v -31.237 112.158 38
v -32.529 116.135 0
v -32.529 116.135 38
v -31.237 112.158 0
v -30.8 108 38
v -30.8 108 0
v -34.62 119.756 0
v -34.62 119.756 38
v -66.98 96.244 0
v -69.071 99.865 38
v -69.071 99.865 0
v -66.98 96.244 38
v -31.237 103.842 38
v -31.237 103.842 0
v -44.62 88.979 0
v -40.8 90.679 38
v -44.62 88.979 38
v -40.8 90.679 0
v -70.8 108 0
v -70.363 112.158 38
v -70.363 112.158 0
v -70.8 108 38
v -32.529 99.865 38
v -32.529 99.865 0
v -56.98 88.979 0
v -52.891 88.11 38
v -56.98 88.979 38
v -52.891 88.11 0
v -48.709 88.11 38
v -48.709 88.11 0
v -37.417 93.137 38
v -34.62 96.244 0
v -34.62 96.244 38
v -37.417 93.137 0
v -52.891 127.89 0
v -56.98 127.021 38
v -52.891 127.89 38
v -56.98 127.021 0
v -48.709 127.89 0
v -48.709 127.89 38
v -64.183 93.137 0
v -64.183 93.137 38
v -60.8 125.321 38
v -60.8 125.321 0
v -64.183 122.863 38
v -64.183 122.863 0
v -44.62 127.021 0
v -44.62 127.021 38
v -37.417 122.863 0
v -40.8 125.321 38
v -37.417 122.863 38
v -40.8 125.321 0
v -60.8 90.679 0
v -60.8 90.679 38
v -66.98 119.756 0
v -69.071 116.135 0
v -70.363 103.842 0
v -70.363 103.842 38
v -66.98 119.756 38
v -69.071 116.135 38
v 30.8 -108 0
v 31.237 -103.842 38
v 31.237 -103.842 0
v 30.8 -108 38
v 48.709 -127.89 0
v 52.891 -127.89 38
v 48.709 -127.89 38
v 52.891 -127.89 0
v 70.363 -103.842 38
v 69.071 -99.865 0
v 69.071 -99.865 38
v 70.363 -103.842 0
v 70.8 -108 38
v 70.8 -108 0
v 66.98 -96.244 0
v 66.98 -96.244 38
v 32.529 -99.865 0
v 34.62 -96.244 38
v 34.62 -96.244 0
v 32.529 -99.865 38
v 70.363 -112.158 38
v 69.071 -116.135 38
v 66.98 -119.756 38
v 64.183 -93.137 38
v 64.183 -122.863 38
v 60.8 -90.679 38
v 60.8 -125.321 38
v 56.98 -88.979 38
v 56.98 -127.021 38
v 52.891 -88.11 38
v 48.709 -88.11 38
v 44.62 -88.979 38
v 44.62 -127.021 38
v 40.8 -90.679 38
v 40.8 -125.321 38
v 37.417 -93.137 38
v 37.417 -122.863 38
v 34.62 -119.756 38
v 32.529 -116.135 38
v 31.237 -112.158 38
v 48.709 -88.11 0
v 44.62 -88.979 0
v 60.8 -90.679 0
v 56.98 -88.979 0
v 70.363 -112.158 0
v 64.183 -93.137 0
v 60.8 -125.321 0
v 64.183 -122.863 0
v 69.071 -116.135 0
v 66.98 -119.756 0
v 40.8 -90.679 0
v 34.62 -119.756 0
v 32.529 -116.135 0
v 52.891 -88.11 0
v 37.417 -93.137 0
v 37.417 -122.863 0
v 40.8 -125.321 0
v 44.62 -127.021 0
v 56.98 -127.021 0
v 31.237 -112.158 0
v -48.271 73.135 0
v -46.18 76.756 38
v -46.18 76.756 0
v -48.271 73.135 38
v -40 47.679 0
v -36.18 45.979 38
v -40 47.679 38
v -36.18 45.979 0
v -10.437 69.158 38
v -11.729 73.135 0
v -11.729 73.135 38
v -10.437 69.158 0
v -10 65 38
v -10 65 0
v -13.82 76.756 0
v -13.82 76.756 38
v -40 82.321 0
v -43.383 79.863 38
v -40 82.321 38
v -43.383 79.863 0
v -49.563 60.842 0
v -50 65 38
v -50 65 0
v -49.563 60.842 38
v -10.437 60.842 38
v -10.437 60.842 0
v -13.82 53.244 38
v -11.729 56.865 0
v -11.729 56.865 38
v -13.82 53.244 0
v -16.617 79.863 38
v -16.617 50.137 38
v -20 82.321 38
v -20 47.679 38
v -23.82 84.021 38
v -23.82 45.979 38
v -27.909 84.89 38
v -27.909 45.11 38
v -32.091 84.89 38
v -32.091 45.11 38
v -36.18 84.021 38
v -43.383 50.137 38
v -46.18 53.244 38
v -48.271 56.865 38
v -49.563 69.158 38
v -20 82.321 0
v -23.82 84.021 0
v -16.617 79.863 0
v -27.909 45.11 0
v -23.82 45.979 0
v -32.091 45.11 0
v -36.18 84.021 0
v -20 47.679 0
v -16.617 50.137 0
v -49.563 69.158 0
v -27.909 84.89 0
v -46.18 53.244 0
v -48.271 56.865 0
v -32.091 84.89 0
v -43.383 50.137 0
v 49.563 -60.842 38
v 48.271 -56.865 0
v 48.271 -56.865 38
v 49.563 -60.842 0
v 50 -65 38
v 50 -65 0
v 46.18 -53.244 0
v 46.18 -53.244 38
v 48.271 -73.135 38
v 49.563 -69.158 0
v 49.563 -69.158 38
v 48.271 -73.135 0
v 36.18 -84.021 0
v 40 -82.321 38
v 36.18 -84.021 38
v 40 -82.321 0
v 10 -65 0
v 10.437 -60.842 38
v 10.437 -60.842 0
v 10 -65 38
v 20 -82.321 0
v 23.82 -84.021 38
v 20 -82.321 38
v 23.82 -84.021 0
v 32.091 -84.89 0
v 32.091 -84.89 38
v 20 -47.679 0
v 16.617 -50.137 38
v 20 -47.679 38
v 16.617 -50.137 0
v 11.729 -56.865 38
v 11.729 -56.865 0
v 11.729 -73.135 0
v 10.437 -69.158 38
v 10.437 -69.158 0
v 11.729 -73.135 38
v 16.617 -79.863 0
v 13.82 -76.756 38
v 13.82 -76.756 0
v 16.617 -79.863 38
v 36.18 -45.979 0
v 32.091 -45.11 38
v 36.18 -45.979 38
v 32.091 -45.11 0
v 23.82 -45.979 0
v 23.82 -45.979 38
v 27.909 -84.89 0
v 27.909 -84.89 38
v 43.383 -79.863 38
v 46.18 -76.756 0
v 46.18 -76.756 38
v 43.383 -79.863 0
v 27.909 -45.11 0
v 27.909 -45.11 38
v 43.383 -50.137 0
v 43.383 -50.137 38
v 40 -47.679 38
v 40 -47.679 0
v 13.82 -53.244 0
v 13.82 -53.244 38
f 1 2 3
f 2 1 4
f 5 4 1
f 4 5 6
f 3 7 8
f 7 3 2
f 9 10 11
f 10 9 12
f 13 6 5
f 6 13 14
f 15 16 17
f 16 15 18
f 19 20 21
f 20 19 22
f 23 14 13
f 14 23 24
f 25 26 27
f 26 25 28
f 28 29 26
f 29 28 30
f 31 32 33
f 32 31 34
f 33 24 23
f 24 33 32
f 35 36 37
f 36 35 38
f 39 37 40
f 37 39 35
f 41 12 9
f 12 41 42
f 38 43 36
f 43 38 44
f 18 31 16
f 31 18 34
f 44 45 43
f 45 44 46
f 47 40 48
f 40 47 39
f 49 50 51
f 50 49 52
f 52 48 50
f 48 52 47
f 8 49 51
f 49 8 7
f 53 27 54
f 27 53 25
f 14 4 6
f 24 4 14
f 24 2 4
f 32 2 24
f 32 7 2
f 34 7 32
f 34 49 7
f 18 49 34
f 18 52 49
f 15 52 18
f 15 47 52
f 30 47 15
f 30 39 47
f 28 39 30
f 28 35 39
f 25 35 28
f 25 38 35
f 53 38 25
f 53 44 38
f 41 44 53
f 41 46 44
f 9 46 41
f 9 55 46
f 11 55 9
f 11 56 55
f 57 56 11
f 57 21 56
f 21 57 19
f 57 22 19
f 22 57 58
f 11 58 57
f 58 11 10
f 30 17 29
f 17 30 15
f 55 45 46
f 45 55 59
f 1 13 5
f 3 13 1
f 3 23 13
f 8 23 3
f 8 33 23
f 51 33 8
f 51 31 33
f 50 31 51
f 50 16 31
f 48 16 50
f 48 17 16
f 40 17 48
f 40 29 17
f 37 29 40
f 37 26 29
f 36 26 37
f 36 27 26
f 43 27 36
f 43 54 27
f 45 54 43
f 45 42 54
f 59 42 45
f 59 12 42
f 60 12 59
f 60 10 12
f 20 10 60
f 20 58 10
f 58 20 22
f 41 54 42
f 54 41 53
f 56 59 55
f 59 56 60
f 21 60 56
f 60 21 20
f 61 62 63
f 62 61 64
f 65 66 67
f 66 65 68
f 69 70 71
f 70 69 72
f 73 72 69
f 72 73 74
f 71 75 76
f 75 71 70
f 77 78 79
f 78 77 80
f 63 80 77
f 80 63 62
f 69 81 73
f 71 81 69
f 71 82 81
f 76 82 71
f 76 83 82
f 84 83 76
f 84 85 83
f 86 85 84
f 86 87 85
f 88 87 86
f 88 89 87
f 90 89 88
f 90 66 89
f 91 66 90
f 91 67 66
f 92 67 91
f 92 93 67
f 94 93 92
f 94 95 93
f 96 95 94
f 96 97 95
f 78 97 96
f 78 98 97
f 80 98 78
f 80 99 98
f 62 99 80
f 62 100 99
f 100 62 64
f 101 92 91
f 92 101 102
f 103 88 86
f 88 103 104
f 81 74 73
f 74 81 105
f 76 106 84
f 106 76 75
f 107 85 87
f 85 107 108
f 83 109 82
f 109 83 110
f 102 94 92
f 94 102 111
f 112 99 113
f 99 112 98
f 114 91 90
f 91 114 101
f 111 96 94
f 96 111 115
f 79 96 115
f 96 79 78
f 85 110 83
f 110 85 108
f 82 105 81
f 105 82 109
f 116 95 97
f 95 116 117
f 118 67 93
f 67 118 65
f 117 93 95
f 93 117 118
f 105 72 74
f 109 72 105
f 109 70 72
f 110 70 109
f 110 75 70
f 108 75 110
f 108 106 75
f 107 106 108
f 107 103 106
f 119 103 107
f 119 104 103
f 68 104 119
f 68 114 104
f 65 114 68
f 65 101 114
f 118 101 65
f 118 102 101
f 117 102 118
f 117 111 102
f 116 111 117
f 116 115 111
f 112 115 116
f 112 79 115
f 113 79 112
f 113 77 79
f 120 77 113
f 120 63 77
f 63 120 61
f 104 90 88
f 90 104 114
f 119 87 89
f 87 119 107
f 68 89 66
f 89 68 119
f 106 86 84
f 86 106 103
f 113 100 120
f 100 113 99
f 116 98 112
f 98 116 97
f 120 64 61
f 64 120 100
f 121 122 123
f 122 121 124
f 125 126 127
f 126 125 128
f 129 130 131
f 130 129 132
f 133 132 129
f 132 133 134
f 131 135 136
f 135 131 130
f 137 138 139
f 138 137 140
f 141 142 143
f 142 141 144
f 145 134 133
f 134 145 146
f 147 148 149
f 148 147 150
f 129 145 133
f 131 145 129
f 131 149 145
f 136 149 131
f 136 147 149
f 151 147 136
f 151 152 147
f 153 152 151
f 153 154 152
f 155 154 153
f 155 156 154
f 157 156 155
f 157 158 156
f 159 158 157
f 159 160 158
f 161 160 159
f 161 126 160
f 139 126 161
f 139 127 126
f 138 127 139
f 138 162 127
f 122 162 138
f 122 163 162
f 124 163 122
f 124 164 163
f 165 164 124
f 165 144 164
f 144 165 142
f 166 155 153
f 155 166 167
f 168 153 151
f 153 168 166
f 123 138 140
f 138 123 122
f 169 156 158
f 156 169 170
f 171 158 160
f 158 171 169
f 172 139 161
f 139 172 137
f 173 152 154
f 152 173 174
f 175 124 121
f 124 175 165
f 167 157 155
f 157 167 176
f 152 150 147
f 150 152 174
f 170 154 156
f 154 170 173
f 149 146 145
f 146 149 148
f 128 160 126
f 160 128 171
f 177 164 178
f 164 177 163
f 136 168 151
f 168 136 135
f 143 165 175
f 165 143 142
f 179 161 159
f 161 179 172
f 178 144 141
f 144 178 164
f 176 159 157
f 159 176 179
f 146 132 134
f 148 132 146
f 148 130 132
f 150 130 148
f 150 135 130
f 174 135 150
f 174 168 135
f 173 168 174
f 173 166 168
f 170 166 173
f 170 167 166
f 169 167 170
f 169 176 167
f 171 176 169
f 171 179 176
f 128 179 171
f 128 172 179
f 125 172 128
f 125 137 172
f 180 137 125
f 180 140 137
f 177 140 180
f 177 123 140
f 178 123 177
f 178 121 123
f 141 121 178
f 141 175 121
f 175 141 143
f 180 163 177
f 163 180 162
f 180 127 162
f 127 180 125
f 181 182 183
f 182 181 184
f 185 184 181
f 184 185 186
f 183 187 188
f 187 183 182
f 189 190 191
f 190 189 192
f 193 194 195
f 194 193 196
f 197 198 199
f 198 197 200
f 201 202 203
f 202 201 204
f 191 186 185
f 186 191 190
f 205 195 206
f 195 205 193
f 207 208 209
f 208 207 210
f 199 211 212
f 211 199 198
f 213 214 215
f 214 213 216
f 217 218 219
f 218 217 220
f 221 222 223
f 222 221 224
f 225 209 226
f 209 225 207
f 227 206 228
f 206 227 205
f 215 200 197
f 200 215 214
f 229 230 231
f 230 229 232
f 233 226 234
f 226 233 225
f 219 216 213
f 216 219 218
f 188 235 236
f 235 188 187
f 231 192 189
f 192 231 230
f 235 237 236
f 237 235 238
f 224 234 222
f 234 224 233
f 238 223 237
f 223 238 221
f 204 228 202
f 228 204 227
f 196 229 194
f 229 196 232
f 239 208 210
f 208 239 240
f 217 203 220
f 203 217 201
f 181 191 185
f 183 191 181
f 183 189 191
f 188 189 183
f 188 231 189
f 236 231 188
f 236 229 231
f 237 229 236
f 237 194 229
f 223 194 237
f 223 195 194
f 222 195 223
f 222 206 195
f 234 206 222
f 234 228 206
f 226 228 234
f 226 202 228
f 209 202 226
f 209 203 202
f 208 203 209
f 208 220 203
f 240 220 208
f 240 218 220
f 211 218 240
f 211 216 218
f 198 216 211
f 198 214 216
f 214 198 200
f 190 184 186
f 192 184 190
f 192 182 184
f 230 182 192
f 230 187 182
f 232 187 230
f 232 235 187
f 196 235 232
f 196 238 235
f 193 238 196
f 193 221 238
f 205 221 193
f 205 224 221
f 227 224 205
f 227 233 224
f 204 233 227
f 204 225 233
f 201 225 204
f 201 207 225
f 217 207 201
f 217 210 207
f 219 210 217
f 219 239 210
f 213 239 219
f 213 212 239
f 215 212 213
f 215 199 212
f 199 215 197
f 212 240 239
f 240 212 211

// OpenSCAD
module pellonrolls()
{
	difference() 
	{
		union() 
		color("white")
		{
			translate([-50.8,108,0]) 
			cylinder(h=38, d=40, $fs=.01); //supply-side takeup pellon
             translate([50.8,-108,0])
			cylinder(h=38, d=40, $fs=.01); //takeup-side takeup pellon
			  translate([-30,65,0])
			cylinder(h=38, d=40, $fs=.01); //supply-side supply pellon
             translate([30,-65,0])
			cylinder(h=38, d=40, $fs=.01); //takeup-side supply pellon
		}
		union()
        color("white")
		{
			translate([-101.6,50.8,0])
			cylinder(h=38, d=13.5, $fs=.01);
             translate([101.6,-50.8,0])
			cylinder(h=38, d=13.5, $fs=.01);
			translate([-70,25,0])
			cylinder(h=38, d=13.5, $fs=.01);
             translate([70,-25,0])
			cylinder(h=38, d=13.5, $fs=.01);
		}
	}
}

pellonrolls();
